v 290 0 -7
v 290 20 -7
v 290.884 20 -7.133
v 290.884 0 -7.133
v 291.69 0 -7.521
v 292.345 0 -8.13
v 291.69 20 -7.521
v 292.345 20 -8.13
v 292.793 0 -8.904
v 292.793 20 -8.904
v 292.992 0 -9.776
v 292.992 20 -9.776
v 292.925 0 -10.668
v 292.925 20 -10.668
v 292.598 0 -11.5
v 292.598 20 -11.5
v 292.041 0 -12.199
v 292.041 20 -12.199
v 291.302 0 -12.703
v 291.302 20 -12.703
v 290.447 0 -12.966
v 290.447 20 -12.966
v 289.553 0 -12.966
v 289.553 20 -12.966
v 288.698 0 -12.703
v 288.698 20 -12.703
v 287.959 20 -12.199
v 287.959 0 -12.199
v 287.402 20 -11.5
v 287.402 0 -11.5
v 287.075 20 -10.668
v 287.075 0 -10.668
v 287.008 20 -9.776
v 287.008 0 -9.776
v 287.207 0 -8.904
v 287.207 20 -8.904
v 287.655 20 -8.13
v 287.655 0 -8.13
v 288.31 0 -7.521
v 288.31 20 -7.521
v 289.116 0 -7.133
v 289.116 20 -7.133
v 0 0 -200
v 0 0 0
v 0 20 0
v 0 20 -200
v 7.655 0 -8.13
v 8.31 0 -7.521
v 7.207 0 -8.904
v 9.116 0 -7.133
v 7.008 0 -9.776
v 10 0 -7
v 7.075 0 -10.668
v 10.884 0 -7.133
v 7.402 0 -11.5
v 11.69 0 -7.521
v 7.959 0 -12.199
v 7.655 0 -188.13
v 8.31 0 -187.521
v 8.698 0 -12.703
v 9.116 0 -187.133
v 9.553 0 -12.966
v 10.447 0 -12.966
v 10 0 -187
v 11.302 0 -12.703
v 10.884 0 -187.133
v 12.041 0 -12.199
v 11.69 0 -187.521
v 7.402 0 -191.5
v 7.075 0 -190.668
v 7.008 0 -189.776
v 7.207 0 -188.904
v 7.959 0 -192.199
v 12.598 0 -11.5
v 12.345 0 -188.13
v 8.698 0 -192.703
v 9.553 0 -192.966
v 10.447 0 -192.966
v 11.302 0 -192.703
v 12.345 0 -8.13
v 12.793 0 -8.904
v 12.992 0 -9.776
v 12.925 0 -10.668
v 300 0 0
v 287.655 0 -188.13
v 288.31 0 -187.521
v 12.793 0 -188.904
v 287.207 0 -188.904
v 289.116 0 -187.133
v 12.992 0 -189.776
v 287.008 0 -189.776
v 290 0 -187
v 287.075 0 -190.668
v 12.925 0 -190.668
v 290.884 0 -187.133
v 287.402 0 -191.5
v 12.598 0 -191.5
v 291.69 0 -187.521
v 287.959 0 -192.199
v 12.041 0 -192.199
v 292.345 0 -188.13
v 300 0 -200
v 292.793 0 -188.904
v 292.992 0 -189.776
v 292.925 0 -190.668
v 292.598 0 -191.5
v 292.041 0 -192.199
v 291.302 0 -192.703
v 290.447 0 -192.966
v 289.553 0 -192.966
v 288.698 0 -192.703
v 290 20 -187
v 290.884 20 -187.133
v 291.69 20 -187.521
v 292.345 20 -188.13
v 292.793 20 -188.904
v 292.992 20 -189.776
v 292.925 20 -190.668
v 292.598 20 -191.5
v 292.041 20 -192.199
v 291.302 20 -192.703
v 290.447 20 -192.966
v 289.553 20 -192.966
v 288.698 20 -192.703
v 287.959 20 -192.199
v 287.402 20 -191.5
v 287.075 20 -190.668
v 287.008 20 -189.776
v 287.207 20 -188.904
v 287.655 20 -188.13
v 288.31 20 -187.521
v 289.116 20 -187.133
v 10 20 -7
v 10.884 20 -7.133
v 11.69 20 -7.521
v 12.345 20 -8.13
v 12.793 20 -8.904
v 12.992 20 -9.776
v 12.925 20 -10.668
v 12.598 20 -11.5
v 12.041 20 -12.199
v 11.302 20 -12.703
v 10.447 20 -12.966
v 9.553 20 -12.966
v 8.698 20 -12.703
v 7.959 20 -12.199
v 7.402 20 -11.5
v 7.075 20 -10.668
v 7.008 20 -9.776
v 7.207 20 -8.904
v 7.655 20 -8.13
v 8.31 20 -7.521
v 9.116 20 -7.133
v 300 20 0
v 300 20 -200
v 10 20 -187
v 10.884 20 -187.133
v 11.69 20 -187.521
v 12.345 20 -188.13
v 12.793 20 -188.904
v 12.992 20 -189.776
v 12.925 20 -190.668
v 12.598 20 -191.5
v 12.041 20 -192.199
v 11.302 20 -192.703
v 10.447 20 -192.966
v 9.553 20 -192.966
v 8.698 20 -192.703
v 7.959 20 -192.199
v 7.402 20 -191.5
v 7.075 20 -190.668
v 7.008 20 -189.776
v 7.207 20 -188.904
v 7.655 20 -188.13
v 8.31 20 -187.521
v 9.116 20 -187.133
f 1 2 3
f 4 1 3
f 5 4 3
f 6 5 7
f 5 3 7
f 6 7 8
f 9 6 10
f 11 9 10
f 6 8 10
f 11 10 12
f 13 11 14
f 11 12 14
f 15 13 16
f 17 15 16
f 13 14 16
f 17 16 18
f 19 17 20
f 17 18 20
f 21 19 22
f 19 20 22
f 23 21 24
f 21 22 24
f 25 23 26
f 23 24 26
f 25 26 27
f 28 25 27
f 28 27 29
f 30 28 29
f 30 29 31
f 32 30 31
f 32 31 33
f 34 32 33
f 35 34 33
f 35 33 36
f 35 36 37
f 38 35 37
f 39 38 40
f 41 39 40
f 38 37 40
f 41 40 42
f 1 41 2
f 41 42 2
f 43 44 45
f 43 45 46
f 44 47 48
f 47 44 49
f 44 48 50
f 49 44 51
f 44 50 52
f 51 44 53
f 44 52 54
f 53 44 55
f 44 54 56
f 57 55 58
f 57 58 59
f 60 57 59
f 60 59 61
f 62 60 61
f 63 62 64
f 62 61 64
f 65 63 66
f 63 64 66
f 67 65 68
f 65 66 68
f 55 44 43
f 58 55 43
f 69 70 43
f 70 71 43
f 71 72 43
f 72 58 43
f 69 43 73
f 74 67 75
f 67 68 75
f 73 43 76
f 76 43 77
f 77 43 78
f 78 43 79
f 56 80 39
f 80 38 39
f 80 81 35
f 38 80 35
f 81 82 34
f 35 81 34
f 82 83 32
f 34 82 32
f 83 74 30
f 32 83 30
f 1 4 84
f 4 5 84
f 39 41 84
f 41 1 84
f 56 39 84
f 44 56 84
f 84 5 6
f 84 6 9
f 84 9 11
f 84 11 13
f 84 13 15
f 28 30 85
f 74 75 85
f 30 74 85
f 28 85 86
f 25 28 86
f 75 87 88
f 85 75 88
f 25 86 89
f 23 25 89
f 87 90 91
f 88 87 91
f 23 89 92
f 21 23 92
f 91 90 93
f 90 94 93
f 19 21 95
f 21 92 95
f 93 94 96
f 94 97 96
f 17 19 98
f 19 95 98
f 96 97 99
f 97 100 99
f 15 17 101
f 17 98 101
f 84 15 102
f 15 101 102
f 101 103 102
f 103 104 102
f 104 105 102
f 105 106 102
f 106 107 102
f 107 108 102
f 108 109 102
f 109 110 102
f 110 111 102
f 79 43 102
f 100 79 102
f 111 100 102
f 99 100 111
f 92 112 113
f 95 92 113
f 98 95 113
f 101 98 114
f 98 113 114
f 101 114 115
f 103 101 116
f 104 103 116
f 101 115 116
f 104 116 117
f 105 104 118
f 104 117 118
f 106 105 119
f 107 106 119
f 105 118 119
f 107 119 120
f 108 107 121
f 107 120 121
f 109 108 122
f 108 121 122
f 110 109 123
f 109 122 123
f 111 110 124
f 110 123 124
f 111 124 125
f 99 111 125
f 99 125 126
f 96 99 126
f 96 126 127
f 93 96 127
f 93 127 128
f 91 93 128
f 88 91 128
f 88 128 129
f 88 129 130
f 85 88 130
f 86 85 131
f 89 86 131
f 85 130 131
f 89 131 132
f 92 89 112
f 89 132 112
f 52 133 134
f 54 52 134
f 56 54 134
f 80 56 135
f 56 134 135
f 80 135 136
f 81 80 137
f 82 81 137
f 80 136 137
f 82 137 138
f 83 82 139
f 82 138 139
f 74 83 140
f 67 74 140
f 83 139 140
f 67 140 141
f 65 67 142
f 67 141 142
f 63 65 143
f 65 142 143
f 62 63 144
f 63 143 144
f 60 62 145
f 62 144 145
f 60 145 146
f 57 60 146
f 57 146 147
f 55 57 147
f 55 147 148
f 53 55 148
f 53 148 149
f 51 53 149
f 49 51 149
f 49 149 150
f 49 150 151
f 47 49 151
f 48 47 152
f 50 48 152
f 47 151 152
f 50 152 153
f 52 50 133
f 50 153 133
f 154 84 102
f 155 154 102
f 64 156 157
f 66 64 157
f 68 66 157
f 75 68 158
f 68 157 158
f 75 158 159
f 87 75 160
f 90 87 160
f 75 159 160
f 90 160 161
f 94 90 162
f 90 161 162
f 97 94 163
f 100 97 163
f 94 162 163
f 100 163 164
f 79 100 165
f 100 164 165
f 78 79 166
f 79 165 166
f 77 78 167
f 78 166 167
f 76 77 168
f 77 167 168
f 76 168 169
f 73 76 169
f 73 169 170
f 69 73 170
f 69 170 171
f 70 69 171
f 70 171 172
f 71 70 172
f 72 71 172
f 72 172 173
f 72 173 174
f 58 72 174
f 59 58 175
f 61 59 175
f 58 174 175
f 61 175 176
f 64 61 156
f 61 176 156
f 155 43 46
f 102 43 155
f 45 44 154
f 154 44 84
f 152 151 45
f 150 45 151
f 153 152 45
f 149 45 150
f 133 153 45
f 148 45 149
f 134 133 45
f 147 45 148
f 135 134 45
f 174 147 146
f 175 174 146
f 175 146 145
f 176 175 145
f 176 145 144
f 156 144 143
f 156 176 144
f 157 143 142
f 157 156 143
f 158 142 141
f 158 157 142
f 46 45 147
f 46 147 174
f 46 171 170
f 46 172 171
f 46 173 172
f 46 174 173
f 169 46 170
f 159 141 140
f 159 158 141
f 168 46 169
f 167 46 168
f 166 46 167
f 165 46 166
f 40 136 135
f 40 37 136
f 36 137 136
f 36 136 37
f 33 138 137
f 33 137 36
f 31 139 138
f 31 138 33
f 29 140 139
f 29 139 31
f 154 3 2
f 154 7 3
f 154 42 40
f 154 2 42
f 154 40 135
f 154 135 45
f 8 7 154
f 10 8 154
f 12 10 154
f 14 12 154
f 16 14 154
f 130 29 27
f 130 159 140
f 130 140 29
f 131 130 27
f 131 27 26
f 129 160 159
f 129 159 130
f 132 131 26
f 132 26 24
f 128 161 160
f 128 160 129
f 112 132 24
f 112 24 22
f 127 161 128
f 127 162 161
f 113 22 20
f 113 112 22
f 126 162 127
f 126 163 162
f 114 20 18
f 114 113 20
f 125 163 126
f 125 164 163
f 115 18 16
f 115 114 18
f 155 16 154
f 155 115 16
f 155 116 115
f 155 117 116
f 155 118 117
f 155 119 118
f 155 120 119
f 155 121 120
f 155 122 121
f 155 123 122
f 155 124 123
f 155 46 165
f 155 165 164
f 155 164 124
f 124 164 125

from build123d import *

# Parameters (mm, degrees)
SKETCH1_W           = 300
SKETCH1_H           = 200
BOSS_EXTRUDE2_DEPTH = 20
SKETCH8_R           = 3
CUT_EXTRUDE14_DEPTH = 20
SKETCH10_R          = 3
CUT_EXTRUDE16_DEPTH = 20
SKETCH11_R          = 3
CUT_EXTRUDE17_DEPTH = 20


with BuildPart() as part:
    # Sketch1 → Boss-Extrude2 (new body)
    with BuildSketch(Plane(origin=(0, 0, 0), x_dir=(1, 0, 0), z_dir=(0, 1, 0))):
        with Locations((150, 100)):
            Rectangle(SKETCH1_W, SKETCH1_H)
    extrude(amount=BOSS_EXTRUDE2_DEPTH)

    # Sketch8 → Cut-Extrude14 (cut)
    with BuildSketch(Plane(origin=(0, 20, 0), x_dir=(1, 0, 0), z_dir=(0, 1, 0))):
        with Locations(Location((10, 190, 0), (0, 0, 270))):
            Circle(SKETCH8_R)
    extrude(amount=-CUT_EXTRUDE14_DEPTH, mode=Mode.SUBTRACT)

    # Sketch10 → Cut-Extrude16 (cut)
    with BuildSketch(Plane(origin=(0, 20, 0), x_dir=(1, 0, 0), z_dir=(0, 1, 0))):
        with Locations(Location((10, 10, 0), (0, 0, 270))):
            Circle(SKETCH10_R)
    extrude(amount=-CUT_EXTRUDE16_DEPTH, mode=Mode.SUBTRACT)

    # Sketch11 → Cut-Extrude17 (cut)
    with BuildSketch(Plane(origin=(0, 20, 0), x_dir=(1, 0, 0), z_dir=(0, 1, 0))):
        with Locations(Location((290, 190, 0), (0, 0, 270))):
            Circle(SKETCH11_R)
        with Locations(Location((290, 10, 0), (0, 0, 270))):
            Circle(SKETCH11_R)
    extrude(amount=-CUT_EXTRUDE17_DEPTH, mode=Mode.SUBTRACT)


solid = part.part
